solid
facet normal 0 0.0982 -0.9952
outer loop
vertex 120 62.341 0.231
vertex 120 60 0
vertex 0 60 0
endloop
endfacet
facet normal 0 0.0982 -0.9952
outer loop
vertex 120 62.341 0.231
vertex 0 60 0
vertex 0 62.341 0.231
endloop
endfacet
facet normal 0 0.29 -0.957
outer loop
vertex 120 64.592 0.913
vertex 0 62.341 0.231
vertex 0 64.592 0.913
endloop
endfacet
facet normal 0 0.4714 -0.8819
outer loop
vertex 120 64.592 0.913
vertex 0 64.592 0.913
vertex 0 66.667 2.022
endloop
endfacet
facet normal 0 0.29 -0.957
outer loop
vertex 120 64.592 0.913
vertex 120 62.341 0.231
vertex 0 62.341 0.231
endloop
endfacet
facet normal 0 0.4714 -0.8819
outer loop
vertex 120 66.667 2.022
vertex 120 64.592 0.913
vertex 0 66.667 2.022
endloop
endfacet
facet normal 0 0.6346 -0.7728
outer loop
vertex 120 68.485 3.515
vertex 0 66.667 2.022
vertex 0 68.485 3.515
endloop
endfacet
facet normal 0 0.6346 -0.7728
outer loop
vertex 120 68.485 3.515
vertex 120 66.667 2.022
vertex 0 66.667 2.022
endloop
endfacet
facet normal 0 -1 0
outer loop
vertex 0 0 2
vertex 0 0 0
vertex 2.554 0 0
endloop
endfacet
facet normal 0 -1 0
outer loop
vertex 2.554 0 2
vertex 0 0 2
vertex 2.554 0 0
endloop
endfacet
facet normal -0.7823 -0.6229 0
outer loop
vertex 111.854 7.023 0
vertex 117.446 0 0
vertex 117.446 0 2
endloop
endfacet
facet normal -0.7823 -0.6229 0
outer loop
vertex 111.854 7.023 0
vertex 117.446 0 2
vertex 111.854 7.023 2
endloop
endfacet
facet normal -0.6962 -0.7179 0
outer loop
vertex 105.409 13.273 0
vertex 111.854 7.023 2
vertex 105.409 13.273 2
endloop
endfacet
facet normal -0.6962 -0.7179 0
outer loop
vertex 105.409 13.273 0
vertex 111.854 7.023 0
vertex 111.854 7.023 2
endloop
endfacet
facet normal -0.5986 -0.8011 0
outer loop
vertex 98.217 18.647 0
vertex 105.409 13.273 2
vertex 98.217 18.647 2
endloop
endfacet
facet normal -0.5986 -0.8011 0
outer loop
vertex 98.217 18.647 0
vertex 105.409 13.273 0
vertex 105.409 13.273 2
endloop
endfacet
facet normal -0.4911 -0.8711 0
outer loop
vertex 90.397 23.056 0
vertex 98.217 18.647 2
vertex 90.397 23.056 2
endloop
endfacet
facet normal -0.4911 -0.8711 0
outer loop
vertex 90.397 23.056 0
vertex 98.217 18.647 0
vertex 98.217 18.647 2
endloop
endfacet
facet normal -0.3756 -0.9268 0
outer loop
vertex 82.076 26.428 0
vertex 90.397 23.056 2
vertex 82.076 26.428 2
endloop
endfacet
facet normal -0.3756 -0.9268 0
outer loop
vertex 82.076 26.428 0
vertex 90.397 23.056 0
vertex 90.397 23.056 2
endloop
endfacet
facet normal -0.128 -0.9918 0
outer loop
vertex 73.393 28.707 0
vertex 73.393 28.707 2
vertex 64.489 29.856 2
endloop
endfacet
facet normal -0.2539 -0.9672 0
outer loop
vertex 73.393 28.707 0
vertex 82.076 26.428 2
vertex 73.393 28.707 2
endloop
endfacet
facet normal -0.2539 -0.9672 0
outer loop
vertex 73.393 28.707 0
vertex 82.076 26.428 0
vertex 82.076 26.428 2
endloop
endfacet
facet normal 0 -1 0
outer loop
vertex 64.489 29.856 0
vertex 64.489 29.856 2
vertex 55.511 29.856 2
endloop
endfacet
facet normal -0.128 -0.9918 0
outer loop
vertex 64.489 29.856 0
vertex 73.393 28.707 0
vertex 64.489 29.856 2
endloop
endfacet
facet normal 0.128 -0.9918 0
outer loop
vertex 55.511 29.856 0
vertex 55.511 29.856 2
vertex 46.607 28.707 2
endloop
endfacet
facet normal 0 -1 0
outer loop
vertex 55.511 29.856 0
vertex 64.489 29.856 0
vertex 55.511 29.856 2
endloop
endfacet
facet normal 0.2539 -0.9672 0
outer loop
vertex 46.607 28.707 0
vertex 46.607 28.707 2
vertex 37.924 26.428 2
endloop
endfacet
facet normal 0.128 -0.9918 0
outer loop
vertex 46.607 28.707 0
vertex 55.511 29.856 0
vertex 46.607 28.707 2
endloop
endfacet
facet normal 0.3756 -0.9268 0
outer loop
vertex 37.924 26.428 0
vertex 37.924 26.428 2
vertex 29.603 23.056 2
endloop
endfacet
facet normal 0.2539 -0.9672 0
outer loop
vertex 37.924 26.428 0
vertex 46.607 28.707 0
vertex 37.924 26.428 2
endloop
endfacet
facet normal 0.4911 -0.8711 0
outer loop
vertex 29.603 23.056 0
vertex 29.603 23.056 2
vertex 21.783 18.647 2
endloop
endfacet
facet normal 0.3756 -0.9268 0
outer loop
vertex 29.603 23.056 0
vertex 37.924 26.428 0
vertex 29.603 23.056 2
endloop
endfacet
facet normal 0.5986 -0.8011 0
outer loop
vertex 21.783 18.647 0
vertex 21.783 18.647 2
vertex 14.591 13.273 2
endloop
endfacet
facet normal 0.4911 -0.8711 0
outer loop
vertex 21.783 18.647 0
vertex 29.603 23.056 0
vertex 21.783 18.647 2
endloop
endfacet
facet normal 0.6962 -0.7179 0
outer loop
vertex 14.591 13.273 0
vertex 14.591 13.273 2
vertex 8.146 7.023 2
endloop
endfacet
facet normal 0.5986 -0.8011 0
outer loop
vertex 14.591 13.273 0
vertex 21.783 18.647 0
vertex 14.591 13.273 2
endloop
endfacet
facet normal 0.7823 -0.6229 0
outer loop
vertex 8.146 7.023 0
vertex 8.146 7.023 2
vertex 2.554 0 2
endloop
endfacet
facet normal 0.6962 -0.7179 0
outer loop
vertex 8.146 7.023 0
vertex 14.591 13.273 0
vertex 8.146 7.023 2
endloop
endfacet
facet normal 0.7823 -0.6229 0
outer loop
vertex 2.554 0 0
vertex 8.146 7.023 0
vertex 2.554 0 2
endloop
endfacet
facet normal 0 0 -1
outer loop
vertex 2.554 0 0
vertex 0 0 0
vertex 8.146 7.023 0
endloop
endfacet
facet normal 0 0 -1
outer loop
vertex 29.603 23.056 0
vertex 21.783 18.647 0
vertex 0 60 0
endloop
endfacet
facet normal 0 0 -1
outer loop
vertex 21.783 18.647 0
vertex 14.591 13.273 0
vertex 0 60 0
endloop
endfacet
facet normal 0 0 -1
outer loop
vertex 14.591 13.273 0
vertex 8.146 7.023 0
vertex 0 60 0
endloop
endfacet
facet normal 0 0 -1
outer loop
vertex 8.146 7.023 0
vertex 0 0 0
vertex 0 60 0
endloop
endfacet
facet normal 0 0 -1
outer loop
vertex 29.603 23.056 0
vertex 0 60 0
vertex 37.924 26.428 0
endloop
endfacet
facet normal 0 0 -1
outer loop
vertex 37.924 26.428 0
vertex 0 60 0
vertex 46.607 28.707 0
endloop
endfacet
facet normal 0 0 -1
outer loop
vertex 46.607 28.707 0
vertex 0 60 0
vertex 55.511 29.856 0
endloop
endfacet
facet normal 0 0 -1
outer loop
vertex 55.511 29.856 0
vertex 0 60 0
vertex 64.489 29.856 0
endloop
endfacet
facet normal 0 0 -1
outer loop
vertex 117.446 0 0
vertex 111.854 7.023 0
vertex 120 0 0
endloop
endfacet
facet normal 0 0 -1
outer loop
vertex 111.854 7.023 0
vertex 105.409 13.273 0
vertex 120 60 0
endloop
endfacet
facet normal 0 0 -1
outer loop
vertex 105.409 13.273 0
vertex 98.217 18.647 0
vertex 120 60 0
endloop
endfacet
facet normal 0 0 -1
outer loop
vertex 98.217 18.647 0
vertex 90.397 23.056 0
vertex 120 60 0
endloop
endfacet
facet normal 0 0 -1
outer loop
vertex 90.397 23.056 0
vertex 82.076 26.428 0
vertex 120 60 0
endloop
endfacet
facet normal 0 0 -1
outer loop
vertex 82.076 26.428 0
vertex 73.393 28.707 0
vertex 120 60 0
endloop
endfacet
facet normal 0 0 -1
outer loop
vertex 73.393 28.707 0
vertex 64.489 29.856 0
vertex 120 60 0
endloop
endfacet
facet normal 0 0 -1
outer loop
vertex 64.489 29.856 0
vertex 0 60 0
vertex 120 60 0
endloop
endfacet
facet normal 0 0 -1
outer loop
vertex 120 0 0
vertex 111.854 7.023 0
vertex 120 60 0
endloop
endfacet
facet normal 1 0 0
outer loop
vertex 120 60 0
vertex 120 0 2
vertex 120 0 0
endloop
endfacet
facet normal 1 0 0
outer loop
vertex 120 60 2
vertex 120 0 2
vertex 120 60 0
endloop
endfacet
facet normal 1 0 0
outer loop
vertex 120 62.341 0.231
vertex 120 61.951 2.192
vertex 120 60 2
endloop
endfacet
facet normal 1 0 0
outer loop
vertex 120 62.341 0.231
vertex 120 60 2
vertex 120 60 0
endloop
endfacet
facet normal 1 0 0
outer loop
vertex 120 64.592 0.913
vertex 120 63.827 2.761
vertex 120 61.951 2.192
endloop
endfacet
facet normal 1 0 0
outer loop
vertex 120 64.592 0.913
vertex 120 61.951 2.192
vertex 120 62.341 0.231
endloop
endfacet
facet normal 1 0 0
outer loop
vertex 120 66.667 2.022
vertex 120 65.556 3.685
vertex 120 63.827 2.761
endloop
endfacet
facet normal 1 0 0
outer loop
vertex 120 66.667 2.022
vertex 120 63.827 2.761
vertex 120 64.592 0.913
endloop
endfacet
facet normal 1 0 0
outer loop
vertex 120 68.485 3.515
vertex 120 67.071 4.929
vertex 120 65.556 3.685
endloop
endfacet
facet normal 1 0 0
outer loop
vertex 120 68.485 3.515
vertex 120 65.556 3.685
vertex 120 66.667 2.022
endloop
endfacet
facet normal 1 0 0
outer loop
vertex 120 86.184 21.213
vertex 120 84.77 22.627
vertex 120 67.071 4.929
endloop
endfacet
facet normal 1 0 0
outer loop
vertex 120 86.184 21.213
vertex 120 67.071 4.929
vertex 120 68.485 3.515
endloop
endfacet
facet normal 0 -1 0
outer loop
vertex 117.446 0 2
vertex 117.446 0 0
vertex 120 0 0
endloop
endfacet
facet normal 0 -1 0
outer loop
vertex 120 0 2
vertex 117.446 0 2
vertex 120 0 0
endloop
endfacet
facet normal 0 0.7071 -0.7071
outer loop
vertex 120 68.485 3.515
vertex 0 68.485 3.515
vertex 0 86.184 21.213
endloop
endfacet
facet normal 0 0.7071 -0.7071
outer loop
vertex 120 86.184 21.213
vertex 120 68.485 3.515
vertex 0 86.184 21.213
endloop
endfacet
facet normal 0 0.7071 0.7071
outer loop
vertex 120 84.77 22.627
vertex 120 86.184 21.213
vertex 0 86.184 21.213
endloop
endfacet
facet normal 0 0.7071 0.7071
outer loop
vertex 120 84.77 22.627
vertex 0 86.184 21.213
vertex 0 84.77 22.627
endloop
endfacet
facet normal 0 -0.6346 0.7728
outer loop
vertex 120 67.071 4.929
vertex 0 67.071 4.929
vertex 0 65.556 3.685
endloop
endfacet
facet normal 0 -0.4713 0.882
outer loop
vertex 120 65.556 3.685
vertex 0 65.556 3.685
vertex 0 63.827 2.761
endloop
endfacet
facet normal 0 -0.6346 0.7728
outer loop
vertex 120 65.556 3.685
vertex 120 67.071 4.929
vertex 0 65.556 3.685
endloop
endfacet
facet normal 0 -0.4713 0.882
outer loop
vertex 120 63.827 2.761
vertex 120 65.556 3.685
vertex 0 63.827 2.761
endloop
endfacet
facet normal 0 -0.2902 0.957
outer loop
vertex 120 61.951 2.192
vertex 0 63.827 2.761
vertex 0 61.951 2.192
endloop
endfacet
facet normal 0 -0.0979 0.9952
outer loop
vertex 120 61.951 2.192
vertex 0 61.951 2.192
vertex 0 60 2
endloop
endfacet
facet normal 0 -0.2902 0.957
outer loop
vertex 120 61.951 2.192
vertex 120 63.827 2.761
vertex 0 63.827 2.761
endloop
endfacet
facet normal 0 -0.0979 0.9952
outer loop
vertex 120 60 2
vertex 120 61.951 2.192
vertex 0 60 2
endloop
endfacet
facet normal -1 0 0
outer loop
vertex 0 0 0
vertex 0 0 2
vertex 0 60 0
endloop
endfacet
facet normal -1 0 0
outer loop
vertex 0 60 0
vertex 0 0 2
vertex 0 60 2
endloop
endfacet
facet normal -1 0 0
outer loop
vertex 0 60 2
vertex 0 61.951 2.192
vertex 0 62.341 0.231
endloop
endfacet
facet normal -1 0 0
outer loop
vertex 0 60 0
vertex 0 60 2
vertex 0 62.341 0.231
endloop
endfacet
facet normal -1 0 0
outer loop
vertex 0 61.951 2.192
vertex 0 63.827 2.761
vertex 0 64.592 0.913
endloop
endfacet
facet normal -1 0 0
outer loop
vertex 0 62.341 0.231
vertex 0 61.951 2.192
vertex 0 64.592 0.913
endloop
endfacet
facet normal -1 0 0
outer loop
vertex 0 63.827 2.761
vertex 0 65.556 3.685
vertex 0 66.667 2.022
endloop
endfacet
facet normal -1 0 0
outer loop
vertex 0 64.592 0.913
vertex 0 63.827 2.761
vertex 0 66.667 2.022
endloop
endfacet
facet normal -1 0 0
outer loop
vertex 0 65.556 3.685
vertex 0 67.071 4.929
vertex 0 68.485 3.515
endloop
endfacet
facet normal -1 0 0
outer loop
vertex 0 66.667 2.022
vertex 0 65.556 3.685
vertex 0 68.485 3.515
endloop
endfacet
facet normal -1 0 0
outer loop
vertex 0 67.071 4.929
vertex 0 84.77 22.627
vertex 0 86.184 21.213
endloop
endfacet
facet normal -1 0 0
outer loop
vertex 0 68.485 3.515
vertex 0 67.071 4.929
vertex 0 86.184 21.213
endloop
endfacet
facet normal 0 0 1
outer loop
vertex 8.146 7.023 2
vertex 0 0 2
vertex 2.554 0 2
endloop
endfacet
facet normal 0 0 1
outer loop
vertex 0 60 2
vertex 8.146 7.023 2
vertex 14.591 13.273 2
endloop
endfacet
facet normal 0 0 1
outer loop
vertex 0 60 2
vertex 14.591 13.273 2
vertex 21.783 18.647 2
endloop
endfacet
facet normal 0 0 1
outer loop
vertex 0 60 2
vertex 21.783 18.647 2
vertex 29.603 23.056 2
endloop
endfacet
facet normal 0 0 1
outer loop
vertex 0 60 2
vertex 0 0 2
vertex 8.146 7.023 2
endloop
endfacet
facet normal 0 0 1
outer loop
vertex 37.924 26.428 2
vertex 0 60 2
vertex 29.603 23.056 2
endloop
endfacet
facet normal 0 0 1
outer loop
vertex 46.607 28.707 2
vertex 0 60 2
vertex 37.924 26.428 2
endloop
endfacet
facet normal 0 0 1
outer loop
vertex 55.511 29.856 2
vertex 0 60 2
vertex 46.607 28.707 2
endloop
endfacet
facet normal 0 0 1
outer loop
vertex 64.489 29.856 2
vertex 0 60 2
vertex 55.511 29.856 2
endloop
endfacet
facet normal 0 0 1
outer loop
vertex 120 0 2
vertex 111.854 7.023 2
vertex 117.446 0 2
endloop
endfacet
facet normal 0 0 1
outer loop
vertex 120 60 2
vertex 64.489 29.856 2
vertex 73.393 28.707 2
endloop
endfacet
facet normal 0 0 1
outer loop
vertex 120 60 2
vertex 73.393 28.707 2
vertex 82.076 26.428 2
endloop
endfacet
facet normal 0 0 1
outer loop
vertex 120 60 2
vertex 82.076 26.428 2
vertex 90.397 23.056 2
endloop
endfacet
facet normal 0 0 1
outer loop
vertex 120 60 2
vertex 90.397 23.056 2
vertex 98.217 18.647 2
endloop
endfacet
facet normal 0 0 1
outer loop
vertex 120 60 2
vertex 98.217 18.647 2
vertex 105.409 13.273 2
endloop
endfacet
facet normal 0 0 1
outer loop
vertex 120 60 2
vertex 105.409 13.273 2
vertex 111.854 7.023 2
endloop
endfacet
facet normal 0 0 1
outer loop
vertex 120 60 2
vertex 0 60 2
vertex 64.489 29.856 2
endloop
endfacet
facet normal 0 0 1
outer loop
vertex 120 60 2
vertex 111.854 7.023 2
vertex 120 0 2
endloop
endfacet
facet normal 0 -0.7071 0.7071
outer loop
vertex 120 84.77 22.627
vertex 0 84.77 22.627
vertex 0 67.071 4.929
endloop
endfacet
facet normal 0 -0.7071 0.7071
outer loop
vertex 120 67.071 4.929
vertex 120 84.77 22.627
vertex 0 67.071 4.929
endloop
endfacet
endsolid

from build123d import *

# Parameters (mm, degrees)
SKETCH_2_W             = 120
SKETCH_2_H             = 60
SM_BASE_FLANGE_1_DEPTH = 2
SM_EDGE_FLANGE_1_DEPTH = 120
CUT_EXTRUDE_3_REACH    = 151.465
SKETCH_3_R             = 70


# Sheet-metal steps are written as plain solids
with BuildPart() as part:
    # Sketch 2 → Базовая кромка1 (new body)
    with BuildSketch(Plane.XY):
        with Locations((60, 30)):
            Rectangle(SKETCH_2_W, SKETCH_2_H)
    extrude(amount=SM_BASE_FLANGE_1_DEPTH)

    # Ребро-кромка1 section (across the edge) → Ребро-кромка1 (add)
    with BuildSketch(Plane(origin=(120, 64.142135624, 2), x_dir=(0, -0.7071067811865438, 0.7071067811865512), z_dir=(-1, 0, 0))):
        with BuildLine():
            Line((-2, 4.142135624), (-2, 29.171572875))
            Line((-2, 29.171572875), (0, 29.171572875))
            Line((0, 29.171572875), (0, 4.142135624))
            ThreePointArc((0, 4.142135624), (0.761204675, 0.3153013), (2.928932188, -2.928932188))
            Line((2.928932188, -2.928932188), (1.514718626, -4.343145751))
            ThreePointArc((1.514718626, -4.343145751), (-1.08655439, -0.450065565), (-2, 4.142135624))
        make_face()
    extrude(amount=SM_EDGE_FLANGE_1_DEPTH)

    # Эскиз3 → Вырез-Вытянуть3 (cut, up to next)
    with BuildSketch(Plane.XY, mode=Mode.PRIVATE) as cut_extrude_3_sk1:
        with Locations((60, -40)):
            Circle(SKETCH_3_R)
    cut_extrude_3_tool1 = extrude(cut_extrude_3_sk1.sketch, amount=CUT_EXTRUDE_3_REACH, mode=Mode.PRIVATE) & part.part
    add(cut_extrude_3_tool1.solids().sort_by_distance((60, -40, 0))[0], mode=Mode.SUBTRACT)


solid = part.part
